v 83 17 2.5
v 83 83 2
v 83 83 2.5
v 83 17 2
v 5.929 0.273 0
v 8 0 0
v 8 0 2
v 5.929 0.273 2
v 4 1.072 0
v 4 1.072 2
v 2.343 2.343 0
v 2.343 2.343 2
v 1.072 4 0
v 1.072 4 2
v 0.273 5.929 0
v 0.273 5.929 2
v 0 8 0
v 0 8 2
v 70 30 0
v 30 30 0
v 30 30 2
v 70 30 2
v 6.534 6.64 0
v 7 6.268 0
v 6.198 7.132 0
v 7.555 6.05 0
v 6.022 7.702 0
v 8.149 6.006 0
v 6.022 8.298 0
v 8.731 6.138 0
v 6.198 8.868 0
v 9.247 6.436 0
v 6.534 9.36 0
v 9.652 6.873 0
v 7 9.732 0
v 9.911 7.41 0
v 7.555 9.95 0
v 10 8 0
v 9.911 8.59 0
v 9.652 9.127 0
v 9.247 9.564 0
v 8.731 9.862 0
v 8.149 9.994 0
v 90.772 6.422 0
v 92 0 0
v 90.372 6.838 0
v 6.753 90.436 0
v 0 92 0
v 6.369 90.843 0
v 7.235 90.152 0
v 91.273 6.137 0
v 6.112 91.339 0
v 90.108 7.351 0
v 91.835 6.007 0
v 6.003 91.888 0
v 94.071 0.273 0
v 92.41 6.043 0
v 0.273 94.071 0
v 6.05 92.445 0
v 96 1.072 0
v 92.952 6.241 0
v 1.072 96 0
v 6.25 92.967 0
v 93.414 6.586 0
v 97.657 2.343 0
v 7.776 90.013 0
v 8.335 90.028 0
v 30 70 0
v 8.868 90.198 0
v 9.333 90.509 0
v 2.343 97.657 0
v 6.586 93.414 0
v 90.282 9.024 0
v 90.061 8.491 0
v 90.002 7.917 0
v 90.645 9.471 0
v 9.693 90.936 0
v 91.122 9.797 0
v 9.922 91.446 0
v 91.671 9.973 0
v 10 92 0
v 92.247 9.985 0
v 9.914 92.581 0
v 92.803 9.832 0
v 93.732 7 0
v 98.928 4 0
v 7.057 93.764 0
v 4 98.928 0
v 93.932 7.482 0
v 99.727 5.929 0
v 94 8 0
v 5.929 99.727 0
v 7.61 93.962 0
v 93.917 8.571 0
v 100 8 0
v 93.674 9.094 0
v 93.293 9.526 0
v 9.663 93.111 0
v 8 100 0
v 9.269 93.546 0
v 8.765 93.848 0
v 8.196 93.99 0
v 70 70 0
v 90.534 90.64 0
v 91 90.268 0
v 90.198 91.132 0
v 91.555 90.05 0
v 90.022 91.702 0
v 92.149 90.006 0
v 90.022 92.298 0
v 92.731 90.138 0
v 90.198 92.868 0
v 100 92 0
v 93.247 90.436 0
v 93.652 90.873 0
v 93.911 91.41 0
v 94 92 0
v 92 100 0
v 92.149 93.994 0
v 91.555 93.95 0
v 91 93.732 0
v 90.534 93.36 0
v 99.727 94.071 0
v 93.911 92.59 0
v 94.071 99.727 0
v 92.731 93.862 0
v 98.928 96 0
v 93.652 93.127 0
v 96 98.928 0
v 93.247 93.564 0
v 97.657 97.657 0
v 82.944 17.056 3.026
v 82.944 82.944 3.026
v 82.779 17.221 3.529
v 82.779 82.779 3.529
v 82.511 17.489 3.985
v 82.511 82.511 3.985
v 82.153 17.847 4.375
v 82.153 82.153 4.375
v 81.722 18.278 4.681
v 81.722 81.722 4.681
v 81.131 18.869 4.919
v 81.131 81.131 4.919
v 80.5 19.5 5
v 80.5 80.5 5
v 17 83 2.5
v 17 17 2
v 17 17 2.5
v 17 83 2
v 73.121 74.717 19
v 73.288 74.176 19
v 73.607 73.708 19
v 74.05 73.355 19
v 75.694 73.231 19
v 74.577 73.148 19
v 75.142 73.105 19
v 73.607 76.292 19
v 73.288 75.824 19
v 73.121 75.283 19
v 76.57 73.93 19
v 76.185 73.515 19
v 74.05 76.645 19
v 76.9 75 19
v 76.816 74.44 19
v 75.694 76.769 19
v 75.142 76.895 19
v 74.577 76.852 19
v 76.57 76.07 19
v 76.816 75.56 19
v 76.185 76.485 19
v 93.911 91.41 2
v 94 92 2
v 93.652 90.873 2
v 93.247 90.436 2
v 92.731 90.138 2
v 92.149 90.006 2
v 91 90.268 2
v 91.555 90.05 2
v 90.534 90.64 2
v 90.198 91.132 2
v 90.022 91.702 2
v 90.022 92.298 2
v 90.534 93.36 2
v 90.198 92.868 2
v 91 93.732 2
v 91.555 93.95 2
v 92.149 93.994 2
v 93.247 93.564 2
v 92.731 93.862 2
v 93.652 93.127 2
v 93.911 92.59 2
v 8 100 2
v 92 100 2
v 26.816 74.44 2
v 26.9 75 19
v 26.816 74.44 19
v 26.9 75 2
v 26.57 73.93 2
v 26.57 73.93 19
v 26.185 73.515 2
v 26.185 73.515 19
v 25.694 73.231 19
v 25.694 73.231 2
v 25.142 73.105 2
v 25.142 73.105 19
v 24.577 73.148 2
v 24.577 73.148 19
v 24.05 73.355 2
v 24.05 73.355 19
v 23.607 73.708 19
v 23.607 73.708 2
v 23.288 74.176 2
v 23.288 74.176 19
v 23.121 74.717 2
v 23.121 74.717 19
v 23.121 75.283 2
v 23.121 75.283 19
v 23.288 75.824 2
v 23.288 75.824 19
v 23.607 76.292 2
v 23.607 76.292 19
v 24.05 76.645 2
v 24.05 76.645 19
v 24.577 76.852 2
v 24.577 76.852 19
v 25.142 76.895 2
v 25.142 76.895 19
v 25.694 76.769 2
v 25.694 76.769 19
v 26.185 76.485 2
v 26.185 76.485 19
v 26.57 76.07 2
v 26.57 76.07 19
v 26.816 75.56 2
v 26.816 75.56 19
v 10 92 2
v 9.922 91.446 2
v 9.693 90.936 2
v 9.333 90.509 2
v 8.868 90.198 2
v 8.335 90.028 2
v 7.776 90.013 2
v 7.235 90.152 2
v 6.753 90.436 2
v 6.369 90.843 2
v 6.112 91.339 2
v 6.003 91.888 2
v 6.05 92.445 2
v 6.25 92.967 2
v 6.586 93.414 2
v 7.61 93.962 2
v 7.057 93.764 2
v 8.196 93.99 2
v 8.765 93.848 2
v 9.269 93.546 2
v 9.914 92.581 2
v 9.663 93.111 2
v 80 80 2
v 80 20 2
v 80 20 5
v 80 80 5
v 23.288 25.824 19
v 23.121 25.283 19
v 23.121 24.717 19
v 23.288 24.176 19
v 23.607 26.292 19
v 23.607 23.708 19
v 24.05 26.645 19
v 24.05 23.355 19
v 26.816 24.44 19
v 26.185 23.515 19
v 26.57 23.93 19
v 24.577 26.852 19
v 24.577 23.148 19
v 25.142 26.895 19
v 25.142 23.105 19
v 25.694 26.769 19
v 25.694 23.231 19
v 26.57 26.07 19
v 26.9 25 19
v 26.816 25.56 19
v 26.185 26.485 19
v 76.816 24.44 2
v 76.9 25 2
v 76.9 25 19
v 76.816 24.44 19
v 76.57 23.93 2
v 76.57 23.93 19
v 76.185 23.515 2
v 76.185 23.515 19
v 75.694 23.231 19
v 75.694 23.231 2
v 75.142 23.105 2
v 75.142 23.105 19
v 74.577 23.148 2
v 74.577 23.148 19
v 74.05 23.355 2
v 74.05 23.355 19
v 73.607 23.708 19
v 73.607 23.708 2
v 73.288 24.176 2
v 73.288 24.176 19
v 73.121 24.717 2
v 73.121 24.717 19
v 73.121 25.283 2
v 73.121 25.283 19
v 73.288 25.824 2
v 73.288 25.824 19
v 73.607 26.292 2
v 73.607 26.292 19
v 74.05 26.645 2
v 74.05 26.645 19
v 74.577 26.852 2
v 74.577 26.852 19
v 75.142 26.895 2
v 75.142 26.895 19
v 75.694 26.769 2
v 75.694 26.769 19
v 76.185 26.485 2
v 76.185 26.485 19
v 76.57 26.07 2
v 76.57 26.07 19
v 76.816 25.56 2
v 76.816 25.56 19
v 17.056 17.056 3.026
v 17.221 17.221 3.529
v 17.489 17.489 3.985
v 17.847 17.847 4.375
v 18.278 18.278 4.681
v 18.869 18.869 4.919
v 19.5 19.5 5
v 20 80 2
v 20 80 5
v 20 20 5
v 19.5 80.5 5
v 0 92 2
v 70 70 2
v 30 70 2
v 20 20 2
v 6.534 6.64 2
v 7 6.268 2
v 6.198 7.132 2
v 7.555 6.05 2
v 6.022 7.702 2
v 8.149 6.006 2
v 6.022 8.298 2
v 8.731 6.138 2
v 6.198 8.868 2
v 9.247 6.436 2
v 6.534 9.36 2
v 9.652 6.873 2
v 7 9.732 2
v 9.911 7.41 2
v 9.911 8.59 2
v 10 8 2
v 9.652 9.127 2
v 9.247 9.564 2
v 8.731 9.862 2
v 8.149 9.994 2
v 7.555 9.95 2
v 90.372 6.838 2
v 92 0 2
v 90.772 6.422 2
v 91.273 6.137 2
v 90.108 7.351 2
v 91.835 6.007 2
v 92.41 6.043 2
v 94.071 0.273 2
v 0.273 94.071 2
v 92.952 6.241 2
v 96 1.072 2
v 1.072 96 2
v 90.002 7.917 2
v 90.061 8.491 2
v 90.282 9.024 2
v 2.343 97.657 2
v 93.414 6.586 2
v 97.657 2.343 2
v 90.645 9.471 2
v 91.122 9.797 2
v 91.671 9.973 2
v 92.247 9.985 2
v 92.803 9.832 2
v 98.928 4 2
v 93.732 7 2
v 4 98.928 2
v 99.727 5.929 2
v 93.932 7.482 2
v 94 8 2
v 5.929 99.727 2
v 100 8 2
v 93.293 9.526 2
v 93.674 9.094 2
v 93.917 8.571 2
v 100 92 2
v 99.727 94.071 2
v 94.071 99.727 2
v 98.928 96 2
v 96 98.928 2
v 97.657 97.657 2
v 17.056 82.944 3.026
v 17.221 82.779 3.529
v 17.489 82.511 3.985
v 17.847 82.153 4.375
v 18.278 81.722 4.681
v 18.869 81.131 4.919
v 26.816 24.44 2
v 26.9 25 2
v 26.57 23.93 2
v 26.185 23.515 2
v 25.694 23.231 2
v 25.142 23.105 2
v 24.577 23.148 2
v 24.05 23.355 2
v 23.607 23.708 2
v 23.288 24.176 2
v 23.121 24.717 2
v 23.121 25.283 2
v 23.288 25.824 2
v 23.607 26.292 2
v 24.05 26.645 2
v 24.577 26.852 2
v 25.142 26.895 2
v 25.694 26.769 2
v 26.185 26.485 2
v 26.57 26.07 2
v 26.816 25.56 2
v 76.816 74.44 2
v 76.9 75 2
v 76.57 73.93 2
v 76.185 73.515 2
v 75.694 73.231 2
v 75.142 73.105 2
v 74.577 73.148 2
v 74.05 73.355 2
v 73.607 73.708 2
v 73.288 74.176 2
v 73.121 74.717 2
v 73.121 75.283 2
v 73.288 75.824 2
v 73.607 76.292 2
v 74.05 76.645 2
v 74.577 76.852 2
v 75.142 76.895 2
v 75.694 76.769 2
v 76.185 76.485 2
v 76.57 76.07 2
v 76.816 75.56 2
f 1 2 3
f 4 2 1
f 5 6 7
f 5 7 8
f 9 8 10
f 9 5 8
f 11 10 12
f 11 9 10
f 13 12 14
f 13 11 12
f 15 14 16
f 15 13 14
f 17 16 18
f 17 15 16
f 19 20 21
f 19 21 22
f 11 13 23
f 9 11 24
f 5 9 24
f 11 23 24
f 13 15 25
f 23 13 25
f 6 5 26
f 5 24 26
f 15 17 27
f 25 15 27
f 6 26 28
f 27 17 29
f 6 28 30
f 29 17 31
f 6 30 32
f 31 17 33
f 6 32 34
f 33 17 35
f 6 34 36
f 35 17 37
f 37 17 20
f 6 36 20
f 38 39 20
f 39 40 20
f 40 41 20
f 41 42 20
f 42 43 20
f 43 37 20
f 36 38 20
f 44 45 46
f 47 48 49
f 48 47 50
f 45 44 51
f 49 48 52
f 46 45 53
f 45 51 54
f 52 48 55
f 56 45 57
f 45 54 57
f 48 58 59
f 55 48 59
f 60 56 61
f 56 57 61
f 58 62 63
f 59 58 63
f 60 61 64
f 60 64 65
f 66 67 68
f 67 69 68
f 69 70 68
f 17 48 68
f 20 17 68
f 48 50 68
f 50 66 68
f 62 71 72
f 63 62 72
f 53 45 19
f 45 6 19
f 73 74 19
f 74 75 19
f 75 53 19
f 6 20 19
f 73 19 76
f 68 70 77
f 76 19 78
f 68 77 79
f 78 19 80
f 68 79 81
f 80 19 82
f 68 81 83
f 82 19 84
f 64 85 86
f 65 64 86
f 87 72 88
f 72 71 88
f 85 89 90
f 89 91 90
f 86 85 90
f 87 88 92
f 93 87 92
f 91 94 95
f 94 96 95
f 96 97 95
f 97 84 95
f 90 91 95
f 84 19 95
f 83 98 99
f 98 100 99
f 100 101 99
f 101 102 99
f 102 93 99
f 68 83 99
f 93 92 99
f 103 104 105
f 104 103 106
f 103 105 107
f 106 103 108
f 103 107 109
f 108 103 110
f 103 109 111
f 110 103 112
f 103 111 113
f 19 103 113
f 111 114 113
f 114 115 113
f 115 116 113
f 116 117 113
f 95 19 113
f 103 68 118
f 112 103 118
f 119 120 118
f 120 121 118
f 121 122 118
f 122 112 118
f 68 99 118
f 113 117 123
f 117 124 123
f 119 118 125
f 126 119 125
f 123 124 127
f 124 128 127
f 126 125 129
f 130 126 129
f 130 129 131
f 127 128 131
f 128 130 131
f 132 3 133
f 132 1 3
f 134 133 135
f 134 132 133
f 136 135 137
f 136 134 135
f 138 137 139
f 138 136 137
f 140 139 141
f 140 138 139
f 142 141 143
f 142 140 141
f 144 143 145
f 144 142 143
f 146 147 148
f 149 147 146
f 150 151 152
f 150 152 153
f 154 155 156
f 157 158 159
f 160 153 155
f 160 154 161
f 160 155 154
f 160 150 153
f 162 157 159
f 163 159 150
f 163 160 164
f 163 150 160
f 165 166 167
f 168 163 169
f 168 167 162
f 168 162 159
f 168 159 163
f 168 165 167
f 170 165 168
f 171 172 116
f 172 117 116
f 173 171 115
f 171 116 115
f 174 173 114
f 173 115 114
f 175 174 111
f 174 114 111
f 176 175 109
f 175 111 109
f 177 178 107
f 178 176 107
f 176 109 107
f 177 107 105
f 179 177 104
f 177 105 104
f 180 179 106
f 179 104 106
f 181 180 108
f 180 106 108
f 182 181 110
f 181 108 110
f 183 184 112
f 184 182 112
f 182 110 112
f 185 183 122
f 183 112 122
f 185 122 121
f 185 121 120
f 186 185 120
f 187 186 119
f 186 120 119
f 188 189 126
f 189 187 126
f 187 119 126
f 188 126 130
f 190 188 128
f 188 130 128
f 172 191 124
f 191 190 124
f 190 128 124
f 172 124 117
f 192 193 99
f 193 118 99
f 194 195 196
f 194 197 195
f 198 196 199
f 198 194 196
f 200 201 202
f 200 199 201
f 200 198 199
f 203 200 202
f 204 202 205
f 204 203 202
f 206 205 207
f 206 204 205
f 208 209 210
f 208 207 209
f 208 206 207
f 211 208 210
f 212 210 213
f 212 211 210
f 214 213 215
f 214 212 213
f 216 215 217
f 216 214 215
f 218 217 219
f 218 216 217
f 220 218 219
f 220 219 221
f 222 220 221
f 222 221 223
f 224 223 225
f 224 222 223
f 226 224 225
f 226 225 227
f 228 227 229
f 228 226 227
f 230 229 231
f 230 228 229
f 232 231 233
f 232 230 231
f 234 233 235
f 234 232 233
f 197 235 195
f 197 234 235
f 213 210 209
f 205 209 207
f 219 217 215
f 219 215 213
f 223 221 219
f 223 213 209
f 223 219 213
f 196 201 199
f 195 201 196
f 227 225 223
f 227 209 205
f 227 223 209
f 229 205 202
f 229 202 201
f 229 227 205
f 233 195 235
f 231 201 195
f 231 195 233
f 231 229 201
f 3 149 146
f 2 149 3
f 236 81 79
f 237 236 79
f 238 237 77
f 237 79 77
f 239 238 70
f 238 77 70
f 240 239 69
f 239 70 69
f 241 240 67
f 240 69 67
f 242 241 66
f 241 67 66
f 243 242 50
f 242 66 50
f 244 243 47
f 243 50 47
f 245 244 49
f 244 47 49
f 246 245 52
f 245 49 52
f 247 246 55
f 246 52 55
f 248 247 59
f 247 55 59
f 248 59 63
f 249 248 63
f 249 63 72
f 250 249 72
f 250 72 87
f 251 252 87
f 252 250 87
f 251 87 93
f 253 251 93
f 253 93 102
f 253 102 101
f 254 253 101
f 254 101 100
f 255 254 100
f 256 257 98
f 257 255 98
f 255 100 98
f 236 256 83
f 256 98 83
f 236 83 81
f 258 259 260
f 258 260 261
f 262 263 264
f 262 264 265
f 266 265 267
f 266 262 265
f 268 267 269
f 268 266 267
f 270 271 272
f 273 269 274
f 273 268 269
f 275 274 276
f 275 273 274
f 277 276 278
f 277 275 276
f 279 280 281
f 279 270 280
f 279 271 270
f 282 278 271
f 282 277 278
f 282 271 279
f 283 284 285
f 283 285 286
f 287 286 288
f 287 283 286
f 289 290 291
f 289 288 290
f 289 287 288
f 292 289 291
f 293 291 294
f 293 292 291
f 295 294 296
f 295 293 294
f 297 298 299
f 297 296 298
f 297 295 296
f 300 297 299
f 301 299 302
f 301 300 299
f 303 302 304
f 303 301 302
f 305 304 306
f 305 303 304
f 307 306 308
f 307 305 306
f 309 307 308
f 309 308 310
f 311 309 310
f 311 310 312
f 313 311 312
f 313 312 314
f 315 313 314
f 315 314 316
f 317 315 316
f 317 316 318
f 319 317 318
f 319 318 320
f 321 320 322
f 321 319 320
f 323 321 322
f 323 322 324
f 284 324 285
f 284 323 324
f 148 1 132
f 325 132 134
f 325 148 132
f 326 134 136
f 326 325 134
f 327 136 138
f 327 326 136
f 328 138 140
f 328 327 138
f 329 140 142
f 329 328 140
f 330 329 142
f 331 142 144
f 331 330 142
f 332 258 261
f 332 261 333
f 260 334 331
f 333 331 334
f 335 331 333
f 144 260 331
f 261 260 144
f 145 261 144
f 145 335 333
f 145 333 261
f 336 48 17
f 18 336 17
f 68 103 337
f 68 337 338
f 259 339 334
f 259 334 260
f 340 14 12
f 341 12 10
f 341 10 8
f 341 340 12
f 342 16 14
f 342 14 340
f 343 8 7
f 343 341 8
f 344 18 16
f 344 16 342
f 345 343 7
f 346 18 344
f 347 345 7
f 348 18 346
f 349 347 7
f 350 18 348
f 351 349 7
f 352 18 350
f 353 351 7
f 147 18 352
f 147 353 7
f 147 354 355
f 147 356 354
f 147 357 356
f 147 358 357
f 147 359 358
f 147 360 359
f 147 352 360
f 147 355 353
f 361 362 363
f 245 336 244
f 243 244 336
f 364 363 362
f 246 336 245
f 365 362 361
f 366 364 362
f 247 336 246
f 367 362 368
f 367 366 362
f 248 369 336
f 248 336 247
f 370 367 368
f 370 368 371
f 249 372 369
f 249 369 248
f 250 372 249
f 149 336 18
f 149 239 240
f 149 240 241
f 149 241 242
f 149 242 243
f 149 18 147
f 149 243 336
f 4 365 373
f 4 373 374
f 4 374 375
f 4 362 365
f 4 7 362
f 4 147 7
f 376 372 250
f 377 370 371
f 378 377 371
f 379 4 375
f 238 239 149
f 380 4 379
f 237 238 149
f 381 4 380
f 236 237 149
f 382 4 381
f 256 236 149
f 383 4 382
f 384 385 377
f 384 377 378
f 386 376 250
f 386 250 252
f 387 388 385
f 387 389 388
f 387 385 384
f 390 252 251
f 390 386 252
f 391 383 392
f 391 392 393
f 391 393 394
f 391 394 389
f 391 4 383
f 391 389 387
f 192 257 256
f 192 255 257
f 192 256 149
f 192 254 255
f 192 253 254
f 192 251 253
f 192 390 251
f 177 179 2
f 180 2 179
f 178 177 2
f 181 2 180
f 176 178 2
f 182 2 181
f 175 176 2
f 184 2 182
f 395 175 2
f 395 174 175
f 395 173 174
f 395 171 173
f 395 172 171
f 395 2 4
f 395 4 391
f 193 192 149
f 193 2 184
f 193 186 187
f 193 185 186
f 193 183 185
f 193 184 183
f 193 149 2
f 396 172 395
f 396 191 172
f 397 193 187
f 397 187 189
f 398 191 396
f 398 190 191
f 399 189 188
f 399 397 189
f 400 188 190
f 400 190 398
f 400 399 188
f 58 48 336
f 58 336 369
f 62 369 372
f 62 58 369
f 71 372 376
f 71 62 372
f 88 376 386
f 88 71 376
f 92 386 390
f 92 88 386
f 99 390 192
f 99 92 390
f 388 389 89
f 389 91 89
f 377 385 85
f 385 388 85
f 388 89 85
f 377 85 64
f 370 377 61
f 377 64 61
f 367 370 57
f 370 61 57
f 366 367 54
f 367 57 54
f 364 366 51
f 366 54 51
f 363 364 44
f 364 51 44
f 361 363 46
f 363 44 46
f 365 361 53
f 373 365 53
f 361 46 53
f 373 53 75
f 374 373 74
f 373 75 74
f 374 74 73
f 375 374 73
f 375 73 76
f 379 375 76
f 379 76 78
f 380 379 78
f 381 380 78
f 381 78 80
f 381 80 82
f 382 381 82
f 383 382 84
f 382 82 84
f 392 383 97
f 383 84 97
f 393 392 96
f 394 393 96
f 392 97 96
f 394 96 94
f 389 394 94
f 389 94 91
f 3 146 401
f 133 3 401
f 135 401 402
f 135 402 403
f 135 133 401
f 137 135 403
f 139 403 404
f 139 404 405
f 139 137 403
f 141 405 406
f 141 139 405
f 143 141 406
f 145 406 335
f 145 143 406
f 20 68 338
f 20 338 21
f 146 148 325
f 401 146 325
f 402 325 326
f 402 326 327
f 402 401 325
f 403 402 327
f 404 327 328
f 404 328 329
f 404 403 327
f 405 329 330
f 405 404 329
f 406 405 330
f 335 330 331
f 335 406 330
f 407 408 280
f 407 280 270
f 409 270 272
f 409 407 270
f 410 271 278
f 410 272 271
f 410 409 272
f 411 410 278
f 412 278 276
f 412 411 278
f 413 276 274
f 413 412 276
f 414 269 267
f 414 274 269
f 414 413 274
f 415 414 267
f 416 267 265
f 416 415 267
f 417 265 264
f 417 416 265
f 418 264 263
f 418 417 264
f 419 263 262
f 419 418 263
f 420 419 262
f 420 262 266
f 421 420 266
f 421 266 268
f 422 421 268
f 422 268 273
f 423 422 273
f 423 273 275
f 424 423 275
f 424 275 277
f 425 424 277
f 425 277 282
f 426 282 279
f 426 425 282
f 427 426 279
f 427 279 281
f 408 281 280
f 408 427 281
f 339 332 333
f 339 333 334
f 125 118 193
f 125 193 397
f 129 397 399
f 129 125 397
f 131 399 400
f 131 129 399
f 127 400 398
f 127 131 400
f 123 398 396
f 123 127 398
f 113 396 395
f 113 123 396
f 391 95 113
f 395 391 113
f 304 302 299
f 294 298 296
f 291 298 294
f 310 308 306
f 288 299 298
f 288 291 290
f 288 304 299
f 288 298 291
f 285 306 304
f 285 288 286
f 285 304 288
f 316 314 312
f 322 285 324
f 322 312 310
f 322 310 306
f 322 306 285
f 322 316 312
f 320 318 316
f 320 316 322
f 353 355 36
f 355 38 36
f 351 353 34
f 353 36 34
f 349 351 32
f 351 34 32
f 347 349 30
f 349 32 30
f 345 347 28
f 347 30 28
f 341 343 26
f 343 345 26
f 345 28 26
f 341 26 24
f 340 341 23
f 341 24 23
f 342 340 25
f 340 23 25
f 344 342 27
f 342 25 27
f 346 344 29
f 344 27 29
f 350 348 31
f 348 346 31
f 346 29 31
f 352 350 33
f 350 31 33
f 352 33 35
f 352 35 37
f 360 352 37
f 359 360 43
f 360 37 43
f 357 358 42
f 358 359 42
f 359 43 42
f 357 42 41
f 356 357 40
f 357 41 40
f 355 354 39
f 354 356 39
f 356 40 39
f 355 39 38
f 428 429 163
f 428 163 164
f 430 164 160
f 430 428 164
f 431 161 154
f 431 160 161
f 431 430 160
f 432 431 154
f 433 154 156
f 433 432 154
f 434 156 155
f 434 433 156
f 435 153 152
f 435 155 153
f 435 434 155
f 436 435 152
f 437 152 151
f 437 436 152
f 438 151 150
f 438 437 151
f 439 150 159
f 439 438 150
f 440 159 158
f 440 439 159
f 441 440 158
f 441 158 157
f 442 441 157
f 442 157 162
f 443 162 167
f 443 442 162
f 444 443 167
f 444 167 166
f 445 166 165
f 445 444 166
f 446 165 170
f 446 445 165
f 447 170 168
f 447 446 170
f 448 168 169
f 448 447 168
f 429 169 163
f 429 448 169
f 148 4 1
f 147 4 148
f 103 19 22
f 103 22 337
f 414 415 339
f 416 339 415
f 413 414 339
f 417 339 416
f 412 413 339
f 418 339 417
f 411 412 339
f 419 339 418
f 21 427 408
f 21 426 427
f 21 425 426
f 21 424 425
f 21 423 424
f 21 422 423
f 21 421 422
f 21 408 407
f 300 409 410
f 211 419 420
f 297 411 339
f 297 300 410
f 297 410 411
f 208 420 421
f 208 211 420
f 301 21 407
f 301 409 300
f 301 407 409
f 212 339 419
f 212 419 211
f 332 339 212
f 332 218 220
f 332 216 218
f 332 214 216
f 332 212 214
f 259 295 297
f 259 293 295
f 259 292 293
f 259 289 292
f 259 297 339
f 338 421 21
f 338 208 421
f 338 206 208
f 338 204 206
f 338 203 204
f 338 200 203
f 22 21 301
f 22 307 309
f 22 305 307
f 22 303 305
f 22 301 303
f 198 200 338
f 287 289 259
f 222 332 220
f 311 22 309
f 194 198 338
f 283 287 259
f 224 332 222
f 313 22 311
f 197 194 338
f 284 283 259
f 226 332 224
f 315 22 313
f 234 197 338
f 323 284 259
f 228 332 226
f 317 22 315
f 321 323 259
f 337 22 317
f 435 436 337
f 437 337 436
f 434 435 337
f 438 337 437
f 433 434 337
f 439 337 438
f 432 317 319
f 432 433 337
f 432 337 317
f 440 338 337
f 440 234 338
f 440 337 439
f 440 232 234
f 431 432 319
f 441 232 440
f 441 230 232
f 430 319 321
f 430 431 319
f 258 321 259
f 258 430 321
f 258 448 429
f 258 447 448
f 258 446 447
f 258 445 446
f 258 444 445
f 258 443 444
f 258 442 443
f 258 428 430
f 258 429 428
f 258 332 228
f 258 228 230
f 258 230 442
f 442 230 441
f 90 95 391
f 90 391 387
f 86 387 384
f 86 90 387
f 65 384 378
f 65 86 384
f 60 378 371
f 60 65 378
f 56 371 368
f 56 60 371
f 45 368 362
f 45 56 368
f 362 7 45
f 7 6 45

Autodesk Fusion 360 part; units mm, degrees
sketch "Skizze1" plane through (0, 0, 0) normal (0, 0, 1) x (1, 0, 0)
  line L0 (8, 0) -> (92, 0)
  line L1 (100, 8) -> (100, 92)
  line L2 (92, 100) -> (8, 100)
  line L3 (0, 92) -> (0, 8)
  arc A0 (8, 100) -> (0, 92) centre (8, 92) ccw
  arc A1 (100, 92) -> (92, 100) centre (92, 92) ccw
  arc A2 (92, 0) -> (100, 8) centre (92, 8) ccw
  arc A3 (0, 8) -> (8, 0) centre (8, 8) ccw
  circle A4 centre (8, 8) radius 2
  circle A5 centre (92, 8) radius 2
  circle A6 centre (92, 92) radius 2
  circle A7 centre (8, 92) radius 2
  line L4 (70, 50) -> (70, 70)
  line L5 (70, 70) -> (50, 70)
  line L6 (70, 70) -> (30, 70)
  line L7 (30, 70) -> (30, 30)
  line L8 (30, 30) -> (70, 30)
  line L9 (70, 30) -> (70, 70)
  line L10 (0, 100) -> (9.4142, 90.5858)
  line L11 (90.5858, 9.4142) -> (100, 0)
  circle A8 centre (25, 75) radius 1.9
  circle A9 centre (75, 75) radius 1.9
  circle A10 centre (75, 25) radius 1.9
  circle A11 centre (25, 25) radius 1.9
  line L12 (80, 50) -> (80, 80)
  line L13 (80, 80) -> (50, 80)
  line L14 (80, 80) -> (20, 80)
  line L15 (20, 80) -> (20, 20)
  line L16 (20, 20) -> (80, 20)
  line L17 (80, 20) -> (80, 80)
  line L18 (17, 83) -> (83, 83)
  line L19 (83, 83) -> (83, 17)
  line L20 (83, 17) -> (17, 17)
  line L21 (17, 17) -> (17, 83)
  point P0 (100, 0)
  point P1 (0, 100)
  dimension "d1" = 100
  dimension "d2" = 100
  dimension "d3" = 8
  dimension "d4" = 4
  dimension "d5" = 4
  dimension "d6" = 4
  dimension "d9" = 40
  dimension "d10" = 40
  dimension "d11" = 3.8
  dimension "d12" = 3.8
  dimension "d13" = 3.8
  dimension "d14" = 3.8
extrude "Extrusion1" add sketch "Skizze1" along normal blind 2 contours L0 L1 L2 L3 A0 A1 A2 A3
extrude "Extrusion2" add sketch "Skizze1" along normal blind 5 contours L18 L19 L20 L21
extrude "Extrusion3" add sketch "Skizze1" along normal blind 2 contours L12 L13 L14 L15 L16 L17
extrude "Extrusion4" add sketch "Skizze1" along normal blind 19 contours A8 | A9 | A10 | A11
fillet "Abrundung1" radius 2.5 4 edges at (50, 17, 5) (17, 50, 5) (50, 83, 5) (83, 50, 5)
